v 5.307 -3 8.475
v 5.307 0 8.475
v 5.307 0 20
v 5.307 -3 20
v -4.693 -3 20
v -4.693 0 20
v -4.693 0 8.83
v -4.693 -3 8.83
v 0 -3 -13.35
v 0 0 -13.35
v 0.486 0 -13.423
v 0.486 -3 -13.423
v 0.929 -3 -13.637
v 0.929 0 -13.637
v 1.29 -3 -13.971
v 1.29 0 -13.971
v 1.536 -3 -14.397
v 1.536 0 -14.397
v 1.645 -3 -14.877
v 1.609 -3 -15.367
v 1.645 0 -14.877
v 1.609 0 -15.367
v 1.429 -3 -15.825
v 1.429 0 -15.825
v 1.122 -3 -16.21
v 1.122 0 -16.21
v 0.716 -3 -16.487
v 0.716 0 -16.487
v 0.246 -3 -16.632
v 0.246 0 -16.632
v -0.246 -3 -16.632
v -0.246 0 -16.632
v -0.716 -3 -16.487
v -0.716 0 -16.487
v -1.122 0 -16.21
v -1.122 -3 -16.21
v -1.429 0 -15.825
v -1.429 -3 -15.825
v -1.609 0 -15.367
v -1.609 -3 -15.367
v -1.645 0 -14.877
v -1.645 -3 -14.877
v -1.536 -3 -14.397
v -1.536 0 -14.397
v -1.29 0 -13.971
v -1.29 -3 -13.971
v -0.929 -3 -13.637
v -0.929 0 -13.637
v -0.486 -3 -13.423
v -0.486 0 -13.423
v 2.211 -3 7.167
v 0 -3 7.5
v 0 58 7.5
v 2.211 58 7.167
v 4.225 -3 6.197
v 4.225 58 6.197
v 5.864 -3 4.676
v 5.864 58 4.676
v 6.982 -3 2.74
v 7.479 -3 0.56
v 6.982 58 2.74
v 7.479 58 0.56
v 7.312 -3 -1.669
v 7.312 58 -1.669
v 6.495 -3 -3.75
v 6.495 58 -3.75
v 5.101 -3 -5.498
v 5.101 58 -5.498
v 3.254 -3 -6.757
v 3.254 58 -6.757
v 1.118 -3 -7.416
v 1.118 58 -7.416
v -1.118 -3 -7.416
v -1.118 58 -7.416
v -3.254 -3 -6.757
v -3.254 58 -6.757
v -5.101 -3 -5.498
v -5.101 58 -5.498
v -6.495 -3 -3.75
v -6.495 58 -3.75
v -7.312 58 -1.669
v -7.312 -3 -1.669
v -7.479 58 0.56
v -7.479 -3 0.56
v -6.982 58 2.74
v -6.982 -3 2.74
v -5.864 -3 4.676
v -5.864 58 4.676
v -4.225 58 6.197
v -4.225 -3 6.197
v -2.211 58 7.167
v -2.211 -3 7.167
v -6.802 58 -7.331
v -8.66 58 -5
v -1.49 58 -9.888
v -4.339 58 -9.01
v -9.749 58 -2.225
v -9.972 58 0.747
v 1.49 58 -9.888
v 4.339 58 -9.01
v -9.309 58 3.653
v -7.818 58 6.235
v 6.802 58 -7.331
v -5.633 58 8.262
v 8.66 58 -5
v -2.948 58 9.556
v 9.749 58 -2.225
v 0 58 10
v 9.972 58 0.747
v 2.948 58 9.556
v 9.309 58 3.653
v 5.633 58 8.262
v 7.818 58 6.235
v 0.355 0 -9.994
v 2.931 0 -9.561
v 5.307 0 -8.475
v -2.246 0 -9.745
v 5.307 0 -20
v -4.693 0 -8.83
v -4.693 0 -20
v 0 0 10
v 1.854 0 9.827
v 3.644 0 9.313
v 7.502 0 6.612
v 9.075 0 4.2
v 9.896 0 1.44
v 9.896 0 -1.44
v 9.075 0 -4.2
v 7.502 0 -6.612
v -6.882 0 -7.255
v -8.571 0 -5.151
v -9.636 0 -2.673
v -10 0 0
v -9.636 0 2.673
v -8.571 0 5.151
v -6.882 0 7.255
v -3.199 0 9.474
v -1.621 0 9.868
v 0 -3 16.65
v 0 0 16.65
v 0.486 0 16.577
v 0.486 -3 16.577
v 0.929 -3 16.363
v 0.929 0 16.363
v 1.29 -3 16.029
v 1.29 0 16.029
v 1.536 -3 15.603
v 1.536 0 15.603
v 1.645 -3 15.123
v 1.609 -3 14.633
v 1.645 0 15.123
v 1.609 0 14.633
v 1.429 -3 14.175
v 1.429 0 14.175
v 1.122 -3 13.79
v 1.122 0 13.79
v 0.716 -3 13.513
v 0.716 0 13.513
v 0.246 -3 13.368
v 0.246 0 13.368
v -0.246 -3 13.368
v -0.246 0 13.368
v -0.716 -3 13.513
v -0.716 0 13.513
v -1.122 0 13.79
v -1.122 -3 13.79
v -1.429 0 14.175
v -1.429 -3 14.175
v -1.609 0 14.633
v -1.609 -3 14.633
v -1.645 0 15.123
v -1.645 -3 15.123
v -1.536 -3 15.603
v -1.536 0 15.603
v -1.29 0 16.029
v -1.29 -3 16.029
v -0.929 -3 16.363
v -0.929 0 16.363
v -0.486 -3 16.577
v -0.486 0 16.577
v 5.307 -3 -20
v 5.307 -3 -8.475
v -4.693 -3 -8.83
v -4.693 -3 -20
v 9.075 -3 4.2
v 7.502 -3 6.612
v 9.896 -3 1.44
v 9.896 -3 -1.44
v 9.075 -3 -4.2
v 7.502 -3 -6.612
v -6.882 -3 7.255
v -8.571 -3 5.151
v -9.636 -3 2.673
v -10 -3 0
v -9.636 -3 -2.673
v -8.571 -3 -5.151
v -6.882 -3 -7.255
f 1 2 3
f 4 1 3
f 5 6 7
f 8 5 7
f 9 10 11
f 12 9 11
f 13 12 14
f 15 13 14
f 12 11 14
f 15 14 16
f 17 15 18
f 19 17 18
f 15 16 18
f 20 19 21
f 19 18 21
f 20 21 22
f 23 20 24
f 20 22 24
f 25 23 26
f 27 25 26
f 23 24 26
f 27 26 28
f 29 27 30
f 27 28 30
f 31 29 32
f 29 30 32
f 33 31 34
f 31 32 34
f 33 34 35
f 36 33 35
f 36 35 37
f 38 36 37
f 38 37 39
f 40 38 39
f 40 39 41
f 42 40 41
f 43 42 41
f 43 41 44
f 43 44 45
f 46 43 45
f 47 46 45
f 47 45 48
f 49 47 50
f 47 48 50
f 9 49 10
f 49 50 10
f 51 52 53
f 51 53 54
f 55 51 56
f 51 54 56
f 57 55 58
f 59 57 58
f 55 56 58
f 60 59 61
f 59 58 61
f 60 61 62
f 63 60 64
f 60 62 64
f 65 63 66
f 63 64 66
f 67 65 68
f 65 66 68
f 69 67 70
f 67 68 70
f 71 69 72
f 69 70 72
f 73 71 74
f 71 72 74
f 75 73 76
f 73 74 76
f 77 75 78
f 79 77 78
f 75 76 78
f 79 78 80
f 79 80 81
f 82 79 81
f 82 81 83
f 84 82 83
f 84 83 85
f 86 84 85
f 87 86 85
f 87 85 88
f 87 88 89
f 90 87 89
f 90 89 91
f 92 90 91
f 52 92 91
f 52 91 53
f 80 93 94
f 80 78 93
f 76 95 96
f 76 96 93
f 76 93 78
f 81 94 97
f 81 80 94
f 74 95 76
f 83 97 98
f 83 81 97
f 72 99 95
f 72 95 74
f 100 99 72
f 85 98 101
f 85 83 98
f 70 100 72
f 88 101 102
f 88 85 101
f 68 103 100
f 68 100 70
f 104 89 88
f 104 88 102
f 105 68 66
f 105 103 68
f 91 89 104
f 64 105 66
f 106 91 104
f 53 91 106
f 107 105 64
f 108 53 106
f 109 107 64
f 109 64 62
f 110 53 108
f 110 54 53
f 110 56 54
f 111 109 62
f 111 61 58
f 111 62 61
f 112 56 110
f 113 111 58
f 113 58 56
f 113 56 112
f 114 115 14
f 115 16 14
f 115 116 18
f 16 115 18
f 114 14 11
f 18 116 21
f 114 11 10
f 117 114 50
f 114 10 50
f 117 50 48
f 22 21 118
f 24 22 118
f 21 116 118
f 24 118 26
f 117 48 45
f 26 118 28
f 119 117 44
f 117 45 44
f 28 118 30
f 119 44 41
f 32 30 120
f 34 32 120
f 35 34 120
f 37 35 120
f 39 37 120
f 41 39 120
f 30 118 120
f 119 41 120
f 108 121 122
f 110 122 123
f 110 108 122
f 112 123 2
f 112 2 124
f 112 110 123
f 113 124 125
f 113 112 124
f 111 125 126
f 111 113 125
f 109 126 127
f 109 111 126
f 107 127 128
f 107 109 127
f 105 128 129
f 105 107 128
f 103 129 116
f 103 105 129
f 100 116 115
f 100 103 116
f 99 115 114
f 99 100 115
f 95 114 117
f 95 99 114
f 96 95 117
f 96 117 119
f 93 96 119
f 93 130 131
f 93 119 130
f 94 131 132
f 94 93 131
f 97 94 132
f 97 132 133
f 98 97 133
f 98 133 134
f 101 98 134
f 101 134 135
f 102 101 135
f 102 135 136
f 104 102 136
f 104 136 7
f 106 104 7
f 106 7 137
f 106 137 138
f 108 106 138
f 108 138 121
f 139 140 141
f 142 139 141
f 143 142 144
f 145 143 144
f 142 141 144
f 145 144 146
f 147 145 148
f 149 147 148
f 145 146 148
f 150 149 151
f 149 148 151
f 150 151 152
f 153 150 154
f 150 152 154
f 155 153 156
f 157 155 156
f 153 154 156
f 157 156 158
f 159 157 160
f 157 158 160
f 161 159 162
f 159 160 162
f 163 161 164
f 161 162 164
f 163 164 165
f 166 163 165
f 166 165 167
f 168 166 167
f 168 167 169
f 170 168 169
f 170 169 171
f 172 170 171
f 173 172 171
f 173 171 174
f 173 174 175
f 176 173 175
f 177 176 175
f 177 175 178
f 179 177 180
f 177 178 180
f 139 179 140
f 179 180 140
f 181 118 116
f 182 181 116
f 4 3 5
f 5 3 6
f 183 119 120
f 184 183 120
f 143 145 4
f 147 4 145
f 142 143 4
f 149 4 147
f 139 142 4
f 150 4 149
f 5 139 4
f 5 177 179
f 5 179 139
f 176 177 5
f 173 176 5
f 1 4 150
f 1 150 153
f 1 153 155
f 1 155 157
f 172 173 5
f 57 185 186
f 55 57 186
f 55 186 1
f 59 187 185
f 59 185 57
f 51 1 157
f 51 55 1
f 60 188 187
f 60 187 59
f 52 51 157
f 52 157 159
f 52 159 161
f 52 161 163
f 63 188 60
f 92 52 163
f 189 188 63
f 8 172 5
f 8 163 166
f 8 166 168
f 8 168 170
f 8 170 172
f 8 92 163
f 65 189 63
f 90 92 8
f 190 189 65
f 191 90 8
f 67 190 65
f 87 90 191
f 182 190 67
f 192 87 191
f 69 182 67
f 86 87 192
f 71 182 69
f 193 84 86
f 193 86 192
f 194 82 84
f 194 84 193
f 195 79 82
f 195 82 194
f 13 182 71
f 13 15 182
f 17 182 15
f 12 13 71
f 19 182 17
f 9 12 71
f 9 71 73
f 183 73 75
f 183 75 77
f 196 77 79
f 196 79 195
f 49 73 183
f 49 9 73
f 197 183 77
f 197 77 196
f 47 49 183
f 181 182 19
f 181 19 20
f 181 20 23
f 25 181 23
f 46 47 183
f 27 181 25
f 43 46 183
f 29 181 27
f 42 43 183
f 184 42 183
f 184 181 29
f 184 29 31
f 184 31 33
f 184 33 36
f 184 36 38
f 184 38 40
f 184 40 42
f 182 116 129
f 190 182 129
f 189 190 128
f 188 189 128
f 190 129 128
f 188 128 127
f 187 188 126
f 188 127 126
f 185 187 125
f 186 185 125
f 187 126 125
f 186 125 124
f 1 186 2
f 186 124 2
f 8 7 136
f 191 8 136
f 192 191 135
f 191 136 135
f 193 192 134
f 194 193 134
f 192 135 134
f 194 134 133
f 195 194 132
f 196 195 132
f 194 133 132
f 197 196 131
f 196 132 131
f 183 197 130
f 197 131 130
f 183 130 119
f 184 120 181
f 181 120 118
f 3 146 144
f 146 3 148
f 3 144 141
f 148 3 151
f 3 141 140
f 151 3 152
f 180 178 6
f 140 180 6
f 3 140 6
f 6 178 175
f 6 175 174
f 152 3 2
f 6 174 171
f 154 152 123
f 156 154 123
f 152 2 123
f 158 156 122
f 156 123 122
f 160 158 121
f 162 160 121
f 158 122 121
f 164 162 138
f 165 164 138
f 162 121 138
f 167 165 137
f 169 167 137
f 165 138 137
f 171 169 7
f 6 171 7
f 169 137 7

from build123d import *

# Parameters (mm, degrees)
ESQUISSE1_R        = 7.5
ESQUISSE1_R_2      = 1.65
BOSS_EXTRU_1_DEPTH = 3
BOSS_EXTRU_2_START = 58
ESQUISSE2_R        = 10
ESQUISSE2_R_2      = 7.5
BOSS_EXTRU_2_DEPTH = 58


with BuildPart() as part:
    # Esquisse1 → Boss.-Extru.1 (new body)
    with BuildSketch(Plane(origin=(0, 0, 0), x_dir=(1, 0, 0), z_dir=(0, 1, 0))):
        with BuildLine():
            Line((0, 20), (5.307172847, 20))
            Line((5.307172847, 20), (5.307172847, 8.475489152))
            ThreePointArc((5.307172847, 8.475489152), (10, 0), (5.307172847, -8.475489152))
            Line((5.307172847, -8.475489152), (5.307172847, -20))
            Line((5.307172847, -20), (0, -20))
            Line((0, -20), (-4.692827153, -20))
            Line((-4.692827153, -20), (-4.692827153, -8.830479789))
            ThreePointArc((-4.692827153, -8.830479789), (-10, 0), (-4.692827153, 8.830479789))
            Line((-4.692827153, 8.830479789), (-4.692827153, 20))
            Line((-4.692827153, 20), (0, 20))
        make_face()
        with Locations(Location((0, 0, 0), (0, 0, 270))):
            Circle(ESQUISSE1_R, mode=Mode.SUBTRACT)
        with Locations(Location((0, 15, 0), (0, 0, 270))):
            Circle(ESQUISSE1_R_2, mode=Mode.SUBTRACT)
        with Locations(Location((0, -15, 0), (0, 0, 270))):
            Circle(ESQUISSE1_R_2, mode=Mode.SUBTRACT)
    extrude(amount=-BOSS_EXTRU_1_DEPTH)

    # Esquisse2 → Boss.-Extru.2 (add)
    with BuildSketch(Plane(origin=(0, 0, 0), x_dir=(1, 0, 0), z_dir=(0, 1, 0)).offset(BOSS_EXTRU_2_START)):
        with Locations(Location((0, 0, 0), (0, 0, 270))):
            Circle(ESQUISSE2_R)
        with Locations(Location((0, 0, 0), (0, 0, 270))):
            Circle(ESQUISSE2_R_2, mode=Mode.SUBTRACT)
    extrude(amount=-BOSS_EXTRU_2_DEPTH)


solid = part.part
